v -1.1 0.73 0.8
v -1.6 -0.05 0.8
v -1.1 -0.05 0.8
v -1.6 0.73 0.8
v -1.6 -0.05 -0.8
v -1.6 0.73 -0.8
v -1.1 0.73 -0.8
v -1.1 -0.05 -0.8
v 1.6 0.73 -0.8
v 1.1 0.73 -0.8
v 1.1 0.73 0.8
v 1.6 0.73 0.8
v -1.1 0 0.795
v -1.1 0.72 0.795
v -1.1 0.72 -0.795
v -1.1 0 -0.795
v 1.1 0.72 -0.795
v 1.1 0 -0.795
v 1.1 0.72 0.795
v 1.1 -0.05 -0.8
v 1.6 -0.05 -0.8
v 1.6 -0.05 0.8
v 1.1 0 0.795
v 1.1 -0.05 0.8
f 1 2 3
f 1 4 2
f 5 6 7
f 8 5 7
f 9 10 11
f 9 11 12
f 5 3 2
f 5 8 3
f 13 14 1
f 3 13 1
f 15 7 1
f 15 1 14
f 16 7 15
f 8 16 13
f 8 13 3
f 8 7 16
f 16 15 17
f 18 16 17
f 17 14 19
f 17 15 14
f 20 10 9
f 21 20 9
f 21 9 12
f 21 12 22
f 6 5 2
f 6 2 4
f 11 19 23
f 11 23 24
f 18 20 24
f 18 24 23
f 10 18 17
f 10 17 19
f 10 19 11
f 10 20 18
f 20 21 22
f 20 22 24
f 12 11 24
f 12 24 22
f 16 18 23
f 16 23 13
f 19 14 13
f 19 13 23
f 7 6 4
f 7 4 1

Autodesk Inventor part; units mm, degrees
ref_plane "YZ Plane" through (0, 0, 0) normal (1, 0, 0) x (0, 1, 0)
ref_plane "XZ Plane" through (0, 0, 0) normal (0, 1, 0) x (-1, 0, 0)
ref_plane "XY Plane" through (0, 0, 0) normal (0, 0, 1) x (1, 0, 0)
sketch "Sketch1" plane through (0, 0, 0) normal (0, 0, 1) x (1, 0, 0)
  line L0 (-1.6, 0.73) -> (-1.1, 0.73)
  line L1 (-1.1, 0.73) -> (-1.1, -0.05)
  line L2 (-1.1, -0.05) -> (-1.6, -0.05)
  line L3 (-1.6, -0.05) -> (-1.6, 0.73)
  line L4 (-1.1, 0.72) -> (1.1, 0.72)
  line L5 (1.1, 0.72) -> (1.1, 0)
  line L6 (1.1, 0) -> (-1.1, 0)
  line L7 (-1.1, 0) -> (-1.1, 0.72)
  line L8 (1.1, 0.73) -> (1.6, 0.73)
  line L9 (1.6, 0.73) -> (1.6, -0.05)
  line L10 (1.6, -0.05) -> (1.1, -0.05)
  line L11 (1.1, -0.05) -> (1.1, 0.73)
  point P0 (0, 0)
  point P1 (0, 0.72)
  point P2 (0, 0)
  dimension "d0" = 3.2
  dimension "d1" = 0.78
  dimension "d2" = 0.5
  dimension "d3" = 0.05
  dimension "d6" = 0.01
extrude "Extrusion1" add sketch "Sketch1" along normal mid plane 1.6 contours L0 L1 L2 L3 | L11 L8 L9 L10 L5
extrude "Extrusion2" add sketch "Sketch1" along normal mid plane 1.59 contours L4 L5 L6 L1
properties part number "Capacitor_3216-0.8mm" material "Copper"
